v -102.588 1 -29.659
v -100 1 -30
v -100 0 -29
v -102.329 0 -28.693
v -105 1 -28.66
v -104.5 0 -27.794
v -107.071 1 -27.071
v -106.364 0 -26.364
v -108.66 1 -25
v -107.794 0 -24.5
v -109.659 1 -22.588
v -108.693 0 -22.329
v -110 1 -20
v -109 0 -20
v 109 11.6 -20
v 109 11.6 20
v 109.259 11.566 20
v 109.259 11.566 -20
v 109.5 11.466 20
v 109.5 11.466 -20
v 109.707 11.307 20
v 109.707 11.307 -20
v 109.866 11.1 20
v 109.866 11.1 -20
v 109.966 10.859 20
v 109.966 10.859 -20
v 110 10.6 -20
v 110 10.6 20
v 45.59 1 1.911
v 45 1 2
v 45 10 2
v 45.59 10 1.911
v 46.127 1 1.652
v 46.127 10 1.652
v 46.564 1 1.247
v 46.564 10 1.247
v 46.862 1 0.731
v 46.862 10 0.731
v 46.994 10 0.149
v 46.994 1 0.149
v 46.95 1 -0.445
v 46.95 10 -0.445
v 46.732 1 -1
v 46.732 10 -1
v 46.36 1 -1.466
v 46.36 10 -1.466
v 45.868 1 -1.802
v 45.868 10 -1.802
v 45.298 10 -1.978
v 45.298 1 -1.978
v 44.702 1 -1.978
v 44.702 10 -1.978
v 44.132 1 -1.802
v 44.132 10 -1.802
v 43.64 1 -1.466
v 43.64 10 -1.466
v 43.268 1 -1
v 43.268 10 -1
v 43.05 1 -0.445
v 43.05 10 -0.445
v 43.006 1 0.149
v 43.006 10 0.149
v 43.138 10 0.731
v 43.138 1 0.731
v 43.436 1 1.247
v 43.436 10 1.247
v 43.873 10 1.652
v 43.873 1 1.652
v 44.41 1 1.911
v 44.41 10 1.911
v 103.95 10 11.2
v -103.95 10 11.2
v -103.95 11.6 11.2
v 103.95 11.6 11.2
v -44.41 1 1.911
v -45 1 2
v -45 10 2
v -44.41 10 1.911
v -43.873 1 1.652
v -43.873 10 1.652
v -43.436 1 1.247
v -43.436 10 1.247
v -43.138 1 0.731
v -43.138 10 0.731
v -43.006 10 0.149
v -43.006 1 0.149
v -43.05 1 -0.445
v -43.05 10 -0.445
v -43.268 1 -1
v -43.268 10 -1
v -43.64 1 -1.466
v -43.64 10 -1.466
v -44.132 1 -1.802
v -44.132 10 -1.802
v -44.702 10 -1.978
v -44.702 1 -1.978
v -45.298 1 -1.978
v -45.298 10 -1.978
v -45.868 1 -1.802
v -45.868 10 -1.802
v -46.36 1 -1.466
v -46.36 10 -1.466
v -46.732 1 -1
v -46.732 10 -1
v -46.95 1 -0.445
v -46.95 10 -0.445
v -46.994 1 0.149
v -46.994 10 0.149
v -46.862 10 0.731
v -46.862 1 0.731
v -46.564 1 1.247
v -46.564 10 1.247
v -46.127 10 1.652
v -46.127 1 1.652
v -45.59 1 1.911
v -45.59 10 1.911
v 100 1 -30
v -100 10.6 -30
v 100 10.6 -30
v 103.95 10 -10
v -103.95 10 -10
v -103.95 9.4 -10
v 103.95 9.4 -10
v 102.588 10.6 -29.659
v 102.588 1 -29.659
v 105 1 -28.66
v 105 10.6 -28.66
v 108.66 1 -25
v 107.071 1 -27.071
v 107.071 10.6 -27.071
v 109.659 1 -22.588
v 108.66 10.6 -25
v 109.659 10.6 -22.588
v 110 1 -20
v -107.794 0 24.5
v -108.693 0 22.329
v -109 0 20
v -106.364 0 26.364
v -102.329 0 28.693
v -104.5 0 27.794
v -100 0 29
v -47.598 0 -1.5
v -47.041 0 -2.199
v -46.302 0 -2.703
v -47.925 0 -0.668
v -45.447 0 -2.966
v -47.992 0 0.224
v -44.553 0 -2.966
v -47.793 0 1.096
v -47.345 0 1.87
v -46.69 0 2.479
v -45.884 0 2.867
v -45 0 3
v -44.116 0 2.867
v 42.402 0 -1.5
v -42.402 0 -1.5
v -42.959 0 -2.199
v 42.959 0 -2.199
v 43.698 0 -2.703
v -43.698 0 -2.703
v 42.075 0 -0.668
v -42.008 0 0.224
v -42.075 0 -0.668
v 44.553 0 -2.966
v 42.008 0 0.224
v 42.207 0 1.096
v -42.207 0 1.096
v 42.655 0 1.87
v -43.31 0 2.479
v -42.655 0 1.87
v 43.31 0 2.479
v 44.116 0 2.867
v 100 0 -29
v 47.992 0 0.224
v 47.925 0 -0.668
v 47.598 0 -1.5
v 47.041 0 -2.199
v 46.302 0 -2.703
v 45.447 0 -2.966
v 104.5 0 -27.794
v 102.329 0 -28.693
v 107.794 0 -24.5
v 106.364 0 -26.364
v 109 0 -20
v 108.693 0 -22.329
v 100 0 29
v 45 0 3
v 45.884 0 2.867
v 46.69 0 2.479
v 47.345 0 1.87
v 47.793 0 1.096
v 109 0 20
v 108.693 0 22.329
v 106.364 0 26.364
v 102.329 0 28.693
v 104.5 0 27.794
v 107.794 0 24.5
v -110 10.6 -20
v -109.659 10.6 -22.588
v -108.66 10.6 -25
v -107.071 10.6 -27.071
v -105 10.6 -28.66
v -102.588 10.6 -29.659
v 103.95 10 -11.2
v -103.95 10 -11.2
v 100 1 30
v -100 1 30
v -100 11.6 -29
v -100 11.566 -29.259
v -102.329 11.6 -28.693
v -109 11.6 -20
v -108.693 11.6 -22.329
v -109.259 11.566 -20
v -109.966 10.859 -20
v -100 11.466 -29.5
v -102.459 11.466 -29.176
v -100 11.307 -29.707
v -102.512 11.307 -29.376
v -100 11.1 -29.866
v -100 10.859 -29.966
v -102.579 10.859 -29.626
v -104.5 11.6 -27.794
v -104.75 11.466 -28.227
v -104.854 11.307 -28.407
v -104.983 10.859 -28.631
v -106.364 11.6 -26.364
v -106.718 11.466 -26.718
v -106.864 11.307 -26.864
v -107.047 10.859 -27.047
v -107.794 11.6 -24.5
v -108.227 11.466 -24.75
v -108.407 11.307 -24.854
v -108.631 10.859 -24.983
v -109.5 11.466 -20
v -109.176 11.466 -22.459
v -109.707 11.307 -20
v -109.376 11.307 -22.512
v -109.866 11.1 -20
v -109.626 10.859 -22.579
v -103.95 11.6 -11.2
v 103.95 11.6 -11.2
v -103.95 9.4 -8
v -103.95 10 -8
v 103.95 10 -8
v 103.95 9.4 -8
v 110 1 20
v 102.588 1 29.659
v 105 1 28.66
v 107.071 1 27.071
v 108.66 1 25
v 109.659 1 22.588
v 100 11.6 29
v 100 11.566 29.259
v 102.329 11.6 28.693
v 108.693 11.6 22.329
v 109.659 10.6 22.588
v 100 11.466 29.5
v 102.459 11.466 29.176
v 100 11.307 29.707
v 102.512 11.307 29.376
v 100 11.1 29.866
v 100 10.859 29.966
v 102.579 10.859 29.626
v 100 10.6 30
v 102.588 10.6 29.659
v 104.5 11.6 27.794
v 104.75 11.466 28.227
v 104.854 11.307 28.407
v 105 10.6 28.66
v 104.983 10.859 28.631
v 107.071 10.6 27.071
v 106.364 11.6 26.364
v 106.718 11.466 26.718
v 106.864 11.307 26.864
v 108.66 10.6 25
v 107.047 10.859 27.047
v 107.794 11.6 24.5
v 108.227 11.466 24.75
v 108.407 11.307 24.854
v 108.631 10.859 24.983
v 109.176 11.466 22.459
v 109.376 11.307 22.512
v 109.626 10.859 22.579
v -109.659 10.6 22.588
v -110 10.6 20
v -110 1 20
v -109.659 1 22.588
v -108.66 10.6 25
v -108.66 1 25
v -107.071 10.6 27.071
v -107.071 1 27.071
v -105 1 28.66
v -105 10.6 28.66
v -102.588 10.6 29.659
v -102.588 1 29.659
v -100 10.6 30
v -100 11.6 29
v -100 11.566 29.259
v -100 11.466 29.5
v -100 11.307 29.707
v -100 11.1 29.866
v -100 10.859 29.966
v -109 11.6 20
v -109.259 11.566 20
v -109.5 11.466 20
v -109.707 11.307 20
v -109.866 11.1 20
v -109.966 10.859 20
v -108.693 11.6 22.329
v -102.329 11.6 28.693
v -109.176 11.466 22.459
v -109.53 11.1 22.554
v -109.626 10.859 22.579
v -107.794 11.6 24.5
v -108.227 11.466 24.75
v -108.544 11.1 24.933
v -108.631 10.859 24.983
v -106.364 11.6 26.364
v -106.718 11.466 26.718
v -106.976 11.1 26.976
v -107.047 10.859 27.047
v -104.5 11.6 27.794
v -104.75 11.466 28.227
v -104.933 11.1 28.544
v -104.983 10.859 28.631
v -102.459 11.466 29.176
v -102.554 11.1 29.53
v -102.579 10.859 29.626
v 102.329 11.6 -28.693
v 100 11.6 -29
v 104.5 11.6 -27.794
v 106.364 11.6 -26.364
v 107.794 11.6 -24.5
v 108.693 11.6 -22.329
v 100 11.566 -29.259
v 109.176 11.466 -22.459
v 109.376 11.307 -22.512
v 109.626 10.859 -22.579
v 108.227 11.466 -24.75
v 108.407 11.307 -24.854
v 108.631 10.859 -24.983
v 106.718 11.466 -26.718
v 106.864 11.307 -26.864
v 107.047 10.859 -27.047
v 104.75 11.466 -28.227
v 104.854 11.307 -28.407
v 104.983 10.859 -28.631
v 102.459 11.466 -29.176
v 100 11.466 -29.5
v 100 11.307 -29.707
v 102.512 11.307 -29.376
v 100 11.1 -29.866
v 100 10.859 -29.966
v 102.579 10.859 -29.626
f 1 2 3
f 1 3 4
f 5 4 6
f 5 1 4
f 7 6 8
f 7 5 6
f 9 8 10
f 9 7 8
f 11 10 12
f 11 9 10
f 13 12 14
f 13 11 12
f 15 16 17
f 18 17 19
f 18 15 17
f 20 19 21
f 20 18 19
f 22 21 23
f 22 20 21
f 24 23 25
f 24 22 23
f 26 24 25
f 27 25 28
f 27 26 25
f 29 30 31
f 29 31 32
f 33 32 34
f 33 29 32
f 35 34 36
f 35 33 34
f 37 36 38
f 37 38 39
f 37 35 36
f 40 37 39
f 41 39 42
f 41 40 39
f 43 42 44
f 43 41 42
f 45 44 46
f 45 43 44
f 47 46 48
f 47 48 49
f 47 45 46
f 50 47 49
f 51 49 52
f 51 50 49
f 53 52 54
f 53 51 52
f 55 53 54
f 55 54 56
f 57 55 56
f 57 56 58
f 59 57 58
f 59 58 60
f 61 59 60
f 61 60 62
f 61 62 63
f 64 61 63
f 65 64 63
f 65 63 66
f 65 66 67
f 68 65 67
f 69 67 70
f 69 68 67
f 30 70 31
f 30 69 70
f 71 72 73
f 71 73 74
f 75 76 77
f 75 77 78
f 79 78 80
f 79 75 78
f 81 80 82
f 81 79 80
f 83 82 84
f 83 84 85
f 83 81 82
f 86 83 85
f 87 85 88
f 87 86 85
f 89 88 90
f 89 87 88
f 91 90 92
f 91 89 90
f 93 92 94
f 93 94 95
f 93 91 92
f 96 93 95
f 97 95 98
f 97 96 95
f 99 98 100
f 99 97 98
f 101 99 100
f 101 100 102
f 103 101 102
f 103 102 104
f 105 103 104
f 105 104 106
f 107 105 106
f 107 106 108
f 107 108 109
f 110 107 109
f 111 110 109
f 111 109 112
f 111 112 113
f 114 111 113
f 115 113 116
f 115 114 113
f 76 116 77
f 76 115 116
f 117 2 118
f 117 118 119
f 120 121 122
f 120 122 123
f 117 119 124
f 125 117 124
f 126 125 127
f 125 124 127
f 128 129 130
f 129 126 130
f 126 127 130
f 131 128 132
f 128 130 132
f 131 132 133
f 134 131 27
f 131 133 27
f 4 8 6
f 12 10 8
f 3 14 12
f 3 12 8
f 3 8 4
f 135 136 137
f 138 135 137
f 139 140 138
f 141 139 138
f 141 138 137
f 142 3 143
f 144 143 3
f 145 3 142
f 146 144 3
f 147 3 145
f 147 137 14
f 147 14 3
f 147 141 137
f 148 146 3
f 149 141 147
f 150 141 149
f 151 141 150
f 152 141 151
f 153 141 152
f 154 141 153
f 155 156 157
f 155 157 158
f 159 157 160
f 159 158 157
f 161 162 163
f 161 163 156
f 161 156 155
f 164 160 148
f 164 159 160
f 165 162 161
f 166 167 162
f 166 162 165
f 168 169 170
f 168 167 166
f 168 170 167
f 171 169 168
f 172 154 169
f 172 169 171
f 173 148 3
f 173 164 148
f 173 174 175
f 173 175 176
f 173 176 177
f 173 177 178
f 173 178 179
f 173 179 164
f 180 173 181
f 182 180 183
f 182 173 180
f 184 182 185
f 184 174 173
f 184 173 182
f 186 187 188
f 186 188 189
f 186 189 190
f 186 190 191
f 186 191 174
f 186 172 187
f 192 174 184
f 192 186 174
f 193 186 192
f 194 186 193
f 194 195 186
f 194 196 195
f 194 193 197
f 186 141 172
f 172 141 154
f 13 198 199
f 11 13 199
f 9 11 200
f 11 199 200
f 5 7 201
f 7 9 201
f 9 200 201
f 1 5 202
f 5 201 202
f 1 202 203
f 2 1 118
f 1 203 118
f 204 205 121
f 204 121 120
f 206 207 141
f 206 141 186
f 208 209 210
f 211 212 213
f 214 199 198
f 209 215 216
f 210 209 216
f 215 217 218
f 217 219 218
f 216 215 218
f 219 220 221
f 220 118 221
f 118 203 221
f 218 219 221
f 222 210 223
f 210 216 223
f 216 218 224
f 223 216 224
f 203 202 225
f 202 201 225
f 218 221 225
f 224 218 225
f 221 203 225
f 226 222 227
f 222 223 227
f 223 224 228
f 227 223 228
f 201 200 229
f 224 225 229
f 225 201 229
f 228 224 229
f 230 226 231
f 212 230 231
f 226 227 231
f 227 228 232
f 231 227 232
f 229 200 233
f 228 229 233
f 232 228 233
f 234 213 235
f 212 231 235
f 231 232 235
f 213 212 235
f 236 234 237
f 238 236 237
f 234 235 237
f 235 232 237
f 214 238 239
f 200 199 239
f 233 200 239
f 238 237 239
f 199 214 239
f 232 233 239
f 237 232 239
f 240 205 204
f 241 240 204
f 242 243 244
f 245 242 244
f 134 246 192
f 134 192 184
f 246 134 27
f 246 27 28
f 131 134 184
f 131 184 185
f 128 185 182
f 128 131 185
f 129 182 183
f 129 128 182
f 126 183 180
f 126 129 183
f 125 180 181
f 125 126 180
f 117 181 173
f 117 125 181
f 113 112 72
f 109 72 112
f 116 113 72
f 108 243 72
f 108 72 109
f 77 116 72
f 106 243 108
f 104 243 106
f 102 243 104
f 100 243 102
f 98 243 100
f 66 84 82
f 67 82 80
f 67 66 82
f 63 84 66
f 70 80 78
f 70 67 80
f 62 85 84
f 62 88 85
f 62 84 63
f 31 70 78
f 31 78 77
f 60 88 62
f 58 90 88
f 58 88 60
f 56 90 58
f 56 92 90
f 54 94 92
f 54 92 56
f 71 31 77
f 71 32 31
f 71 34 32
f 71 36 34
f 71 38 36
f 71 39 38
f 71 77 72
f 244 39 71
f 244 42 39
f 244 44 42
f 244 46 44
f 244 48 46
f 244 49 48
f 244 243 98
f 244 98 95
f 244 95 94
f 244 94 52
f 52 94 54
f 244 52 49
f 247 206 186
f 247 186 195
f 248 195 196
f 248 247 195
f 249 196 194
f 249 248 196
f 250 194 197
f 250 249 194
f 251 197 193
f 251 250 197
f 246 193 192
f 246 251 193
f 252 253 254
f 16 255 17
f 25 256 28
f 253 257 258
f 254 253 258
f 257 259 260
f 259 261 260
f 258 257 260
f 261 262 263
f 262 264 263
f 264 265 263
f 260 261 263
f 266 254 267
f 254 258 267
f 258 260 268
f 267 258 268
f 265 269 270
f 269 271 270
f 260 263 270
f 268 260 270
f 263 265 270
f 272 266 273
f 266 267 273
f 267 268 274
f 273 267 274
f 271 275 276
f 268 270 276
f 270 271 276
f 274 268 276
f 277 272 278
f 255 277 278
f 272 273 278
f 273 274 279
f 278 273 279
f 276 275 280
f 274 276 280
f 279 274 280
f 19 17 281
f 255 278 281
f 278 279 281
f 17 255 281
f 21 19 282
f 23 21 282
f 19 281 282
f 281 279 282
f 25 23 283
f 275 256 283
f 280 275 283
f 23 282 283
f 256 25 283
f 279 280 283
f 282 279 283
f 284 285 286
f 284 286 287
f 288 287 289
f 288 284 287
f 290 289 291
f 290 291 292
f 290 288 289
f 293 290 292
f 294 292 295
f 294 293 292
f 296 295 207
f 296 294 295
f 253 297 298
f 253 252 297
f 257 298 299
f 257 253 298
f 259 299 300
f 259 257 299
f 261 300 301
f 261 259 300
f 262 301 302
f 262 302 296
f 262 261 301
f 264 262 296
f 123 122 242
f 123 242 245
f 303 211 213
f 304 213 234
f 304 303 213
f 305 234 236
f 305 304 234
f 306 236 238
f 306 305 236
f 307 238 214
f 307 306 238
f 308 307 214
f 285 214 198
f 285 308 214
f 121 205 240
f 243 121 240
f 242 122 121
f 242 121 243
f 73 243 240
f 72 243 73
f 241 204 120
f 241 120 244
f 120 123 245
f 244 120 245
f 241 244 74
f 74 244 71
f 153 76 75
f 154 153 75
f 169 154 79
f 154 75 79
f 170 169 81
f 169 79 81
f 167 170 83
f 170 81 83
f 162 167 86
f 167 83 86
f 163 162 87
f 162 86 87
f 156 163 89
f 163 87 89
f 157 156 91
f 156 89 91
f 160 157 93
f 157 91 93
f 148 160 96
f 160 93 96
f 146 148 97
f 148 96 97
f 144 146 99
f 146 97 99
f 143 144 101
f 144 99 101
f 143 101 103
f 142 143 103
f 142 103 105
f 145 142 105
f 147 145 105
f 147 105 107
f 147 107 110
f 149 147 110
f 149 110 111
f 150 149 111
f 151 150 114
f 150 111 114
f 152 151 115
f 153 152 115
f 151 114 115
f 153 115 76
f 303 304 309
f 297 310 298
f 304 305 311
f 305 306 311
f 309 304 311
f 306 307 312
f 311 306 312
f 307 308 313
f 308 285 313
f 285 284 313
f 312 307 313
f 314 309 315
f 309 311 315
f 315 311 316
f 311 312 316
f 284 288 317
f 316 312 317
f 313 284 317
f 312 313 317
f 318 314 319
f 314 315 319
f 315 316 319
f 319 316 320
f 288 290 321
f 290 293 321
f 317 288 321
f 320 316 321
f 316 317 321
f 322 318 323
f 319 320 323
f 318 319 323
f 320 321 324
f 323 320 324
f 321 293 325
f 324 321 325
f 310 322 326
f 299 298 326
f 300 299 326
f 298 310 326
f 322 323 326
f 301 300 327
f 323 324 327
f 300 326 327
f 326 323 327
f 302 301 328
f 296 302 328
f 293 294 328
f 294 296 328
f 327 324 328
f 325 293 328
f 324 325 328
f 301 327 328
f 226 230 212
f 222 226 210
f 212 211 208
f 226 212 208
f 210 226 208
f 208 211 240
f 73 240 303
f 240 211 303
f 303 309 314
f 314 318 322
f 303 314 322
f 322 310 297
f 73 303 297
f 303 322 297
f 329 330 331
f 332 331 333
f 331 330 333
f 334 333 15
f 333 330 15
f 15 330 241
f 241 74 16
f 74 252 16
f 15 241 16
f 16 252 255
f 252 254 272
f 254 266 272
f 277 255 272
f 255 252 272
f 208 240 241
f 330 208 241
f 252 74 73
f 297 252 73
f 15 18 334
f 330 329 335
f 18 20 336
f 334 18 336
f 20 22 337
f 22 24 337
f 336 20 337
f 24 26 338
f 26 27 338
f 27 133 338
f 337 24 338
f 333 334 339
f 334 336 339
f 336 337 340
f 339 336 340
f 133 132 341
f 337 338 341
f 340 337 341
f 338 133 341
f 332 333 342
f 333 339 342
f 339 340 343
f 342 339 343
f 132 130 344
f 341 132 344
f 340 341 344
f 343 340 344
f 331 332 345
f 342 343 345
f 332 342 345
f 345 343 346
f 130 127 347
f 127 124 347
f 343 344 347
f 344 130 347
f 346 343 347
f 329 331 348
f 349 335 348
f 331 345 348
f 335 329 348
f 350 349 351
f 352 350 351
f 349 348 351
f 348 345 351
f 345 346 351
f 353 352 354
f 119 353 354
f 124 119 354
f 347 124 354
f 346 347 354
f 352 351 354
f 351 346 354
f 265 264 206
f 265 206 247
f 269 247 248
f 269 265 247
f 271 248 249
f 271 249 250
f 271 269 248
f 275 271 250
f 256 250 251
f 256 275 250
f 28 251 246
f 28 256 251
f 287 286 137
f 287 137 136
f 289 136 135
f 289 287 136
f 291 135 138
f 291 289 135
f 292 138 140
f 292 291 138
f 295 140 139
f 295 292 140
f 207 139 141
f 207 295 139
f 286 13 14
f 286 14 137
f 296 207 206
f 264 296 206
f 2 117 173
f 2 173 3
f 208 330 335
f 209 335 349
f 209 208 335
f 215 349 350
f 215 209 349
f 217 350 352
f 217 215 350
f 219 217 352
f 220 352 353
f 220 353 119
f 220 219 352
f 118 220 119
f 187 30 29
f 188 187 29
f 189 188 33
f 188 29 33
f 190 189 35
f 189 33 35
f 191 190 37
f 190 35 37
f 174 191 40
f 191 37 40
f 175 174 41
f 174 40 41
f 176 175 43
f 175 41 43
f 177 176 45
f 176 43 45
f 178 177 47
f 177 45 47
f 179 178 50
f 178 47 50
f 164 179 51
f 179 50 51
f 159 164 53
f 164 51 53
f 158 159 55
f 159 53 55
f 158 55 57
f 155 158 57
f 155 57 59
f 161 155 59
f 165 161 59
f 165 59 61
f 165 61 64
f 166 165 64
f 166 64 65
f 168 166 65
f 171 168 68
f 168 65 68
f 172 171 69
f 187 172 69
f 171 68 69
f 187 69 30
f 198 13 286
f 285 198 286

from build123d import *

# Parameters (mm, degrees)
SKETCH1_W           = 207.9
SKETCH1_H           = 22.4
SKETCH1_R           = 2
BOSS_EXTRUDE1_DEPTH = 10
SKETCH2_W           = 220
SKETCH2_H           = 60
SKETCH2_W_2         = 207.9
SKETCH2_H_2         = 22.4
BOSS_EXTRUDE2_DEPTH = 11.6
FILLET1_R           = 10
FILLET2_R           = 1
CHAMFER1_SIZE       = 1
SKETCH3_W           = 207.9
SKETCH3_H           = 2
CUT_EXTRUDE1_DEPTH  = 0.6


with BuildPart() as part:
    # Sketch1 → Boss-Extrude1 (new body)
    with BuildSketch(Plane(origin=(0, 0, 0), x_dir=(1, 0, 0), z_dir=(0, 1, 0))):
        Rectangle(SKETCH1_W, SKETCH1_H)
        with Locations(Location((-45, 0, 0), (0, 0, 270))):
            Circle(SKETCH1_R, mode=Mode.SUBTRACT)
        with Locations(Location((45, 0, 0), (0, 0, 270))):
            Circle(SKETCH1_R, mode=Mode.SUBTRACT)
    extrude(amount=BOSS_EXTRUDE1_DEPTH)

    # Sketch2 → Boss-Extrude2 (add)
    with BuildSketch(Plane.XZ):
        Rectangle(SKETCH2_W, SKETCH2_H)
        Rectangle(SKETCH2_W_2, SKETCH2_H_2, mode=Mode.SUBTRACT)
    extrude(amount=-BOSS_EXTRUDE2_DEPTH)

    # Fillet1
    fillet1_edges = [part.edges().sort_by_distance(p)[0] for p in [
        (-110, 5.8, 30),
        (-110, 5.8, -30),
        (110, 5.8, -30),
        (110, 5.8, 30),
    ]]
    fillet(fillet1_edges, radius=FILLET1_R)

    # Fillet2
    fillet2_edges = [part.edges().sort_by_distance(p)[0] for p in [
        (0, 11.6, 30),
        (-110, 11.6, 0),
        (110, 11.6, 0),
        (0, 11.6, -30),
        (107.071067812, 11.6, -27.071067812),
        (107.071067812, 11.6, 27.071067812),
        (-107.071067812, 11.6, -27.071067812),
        (-107.071067812, 11.6, 27.071067812),
    ]]
    fillet(fillet2_edges, radius=FILLET2_R)

    # Chamfer1
    chamfer1_edges = [part.edges().sort_by_distance(p)[0] for p in [
        (-45, 0, -2),
        (45, 0, -2),
        (0, 0, 30),
        (110, 0, 0),
        (-110, 0, 0),
        (0, 0, -30),
        (107.071067812, 0, -27.071067812),
        (107.071067812, 0, 27.071067812),
        (-107.071067812, 0, -27.071067812),
        (-107.071067812, 0, 27.071067812),
    ]]
    chamfer(chamfer1_edges, length=CHAMFER1_SIZE)

    # Sketch3 → Cut-Extrude1 (cut)
    with BuildSketch(Plane(origin=(0, 10, 0), x_dir=(1, 0, 0), z_dir=(0, 1, 0))):
        with Locations((0, 9)):
            Rectangle(SKETCH3_W, SKETCH3_H)
    extrude(amount=-CUT_EXTRUDE1_DEPTH, mode=Mode.SUBTRACT)


solid = part.part
